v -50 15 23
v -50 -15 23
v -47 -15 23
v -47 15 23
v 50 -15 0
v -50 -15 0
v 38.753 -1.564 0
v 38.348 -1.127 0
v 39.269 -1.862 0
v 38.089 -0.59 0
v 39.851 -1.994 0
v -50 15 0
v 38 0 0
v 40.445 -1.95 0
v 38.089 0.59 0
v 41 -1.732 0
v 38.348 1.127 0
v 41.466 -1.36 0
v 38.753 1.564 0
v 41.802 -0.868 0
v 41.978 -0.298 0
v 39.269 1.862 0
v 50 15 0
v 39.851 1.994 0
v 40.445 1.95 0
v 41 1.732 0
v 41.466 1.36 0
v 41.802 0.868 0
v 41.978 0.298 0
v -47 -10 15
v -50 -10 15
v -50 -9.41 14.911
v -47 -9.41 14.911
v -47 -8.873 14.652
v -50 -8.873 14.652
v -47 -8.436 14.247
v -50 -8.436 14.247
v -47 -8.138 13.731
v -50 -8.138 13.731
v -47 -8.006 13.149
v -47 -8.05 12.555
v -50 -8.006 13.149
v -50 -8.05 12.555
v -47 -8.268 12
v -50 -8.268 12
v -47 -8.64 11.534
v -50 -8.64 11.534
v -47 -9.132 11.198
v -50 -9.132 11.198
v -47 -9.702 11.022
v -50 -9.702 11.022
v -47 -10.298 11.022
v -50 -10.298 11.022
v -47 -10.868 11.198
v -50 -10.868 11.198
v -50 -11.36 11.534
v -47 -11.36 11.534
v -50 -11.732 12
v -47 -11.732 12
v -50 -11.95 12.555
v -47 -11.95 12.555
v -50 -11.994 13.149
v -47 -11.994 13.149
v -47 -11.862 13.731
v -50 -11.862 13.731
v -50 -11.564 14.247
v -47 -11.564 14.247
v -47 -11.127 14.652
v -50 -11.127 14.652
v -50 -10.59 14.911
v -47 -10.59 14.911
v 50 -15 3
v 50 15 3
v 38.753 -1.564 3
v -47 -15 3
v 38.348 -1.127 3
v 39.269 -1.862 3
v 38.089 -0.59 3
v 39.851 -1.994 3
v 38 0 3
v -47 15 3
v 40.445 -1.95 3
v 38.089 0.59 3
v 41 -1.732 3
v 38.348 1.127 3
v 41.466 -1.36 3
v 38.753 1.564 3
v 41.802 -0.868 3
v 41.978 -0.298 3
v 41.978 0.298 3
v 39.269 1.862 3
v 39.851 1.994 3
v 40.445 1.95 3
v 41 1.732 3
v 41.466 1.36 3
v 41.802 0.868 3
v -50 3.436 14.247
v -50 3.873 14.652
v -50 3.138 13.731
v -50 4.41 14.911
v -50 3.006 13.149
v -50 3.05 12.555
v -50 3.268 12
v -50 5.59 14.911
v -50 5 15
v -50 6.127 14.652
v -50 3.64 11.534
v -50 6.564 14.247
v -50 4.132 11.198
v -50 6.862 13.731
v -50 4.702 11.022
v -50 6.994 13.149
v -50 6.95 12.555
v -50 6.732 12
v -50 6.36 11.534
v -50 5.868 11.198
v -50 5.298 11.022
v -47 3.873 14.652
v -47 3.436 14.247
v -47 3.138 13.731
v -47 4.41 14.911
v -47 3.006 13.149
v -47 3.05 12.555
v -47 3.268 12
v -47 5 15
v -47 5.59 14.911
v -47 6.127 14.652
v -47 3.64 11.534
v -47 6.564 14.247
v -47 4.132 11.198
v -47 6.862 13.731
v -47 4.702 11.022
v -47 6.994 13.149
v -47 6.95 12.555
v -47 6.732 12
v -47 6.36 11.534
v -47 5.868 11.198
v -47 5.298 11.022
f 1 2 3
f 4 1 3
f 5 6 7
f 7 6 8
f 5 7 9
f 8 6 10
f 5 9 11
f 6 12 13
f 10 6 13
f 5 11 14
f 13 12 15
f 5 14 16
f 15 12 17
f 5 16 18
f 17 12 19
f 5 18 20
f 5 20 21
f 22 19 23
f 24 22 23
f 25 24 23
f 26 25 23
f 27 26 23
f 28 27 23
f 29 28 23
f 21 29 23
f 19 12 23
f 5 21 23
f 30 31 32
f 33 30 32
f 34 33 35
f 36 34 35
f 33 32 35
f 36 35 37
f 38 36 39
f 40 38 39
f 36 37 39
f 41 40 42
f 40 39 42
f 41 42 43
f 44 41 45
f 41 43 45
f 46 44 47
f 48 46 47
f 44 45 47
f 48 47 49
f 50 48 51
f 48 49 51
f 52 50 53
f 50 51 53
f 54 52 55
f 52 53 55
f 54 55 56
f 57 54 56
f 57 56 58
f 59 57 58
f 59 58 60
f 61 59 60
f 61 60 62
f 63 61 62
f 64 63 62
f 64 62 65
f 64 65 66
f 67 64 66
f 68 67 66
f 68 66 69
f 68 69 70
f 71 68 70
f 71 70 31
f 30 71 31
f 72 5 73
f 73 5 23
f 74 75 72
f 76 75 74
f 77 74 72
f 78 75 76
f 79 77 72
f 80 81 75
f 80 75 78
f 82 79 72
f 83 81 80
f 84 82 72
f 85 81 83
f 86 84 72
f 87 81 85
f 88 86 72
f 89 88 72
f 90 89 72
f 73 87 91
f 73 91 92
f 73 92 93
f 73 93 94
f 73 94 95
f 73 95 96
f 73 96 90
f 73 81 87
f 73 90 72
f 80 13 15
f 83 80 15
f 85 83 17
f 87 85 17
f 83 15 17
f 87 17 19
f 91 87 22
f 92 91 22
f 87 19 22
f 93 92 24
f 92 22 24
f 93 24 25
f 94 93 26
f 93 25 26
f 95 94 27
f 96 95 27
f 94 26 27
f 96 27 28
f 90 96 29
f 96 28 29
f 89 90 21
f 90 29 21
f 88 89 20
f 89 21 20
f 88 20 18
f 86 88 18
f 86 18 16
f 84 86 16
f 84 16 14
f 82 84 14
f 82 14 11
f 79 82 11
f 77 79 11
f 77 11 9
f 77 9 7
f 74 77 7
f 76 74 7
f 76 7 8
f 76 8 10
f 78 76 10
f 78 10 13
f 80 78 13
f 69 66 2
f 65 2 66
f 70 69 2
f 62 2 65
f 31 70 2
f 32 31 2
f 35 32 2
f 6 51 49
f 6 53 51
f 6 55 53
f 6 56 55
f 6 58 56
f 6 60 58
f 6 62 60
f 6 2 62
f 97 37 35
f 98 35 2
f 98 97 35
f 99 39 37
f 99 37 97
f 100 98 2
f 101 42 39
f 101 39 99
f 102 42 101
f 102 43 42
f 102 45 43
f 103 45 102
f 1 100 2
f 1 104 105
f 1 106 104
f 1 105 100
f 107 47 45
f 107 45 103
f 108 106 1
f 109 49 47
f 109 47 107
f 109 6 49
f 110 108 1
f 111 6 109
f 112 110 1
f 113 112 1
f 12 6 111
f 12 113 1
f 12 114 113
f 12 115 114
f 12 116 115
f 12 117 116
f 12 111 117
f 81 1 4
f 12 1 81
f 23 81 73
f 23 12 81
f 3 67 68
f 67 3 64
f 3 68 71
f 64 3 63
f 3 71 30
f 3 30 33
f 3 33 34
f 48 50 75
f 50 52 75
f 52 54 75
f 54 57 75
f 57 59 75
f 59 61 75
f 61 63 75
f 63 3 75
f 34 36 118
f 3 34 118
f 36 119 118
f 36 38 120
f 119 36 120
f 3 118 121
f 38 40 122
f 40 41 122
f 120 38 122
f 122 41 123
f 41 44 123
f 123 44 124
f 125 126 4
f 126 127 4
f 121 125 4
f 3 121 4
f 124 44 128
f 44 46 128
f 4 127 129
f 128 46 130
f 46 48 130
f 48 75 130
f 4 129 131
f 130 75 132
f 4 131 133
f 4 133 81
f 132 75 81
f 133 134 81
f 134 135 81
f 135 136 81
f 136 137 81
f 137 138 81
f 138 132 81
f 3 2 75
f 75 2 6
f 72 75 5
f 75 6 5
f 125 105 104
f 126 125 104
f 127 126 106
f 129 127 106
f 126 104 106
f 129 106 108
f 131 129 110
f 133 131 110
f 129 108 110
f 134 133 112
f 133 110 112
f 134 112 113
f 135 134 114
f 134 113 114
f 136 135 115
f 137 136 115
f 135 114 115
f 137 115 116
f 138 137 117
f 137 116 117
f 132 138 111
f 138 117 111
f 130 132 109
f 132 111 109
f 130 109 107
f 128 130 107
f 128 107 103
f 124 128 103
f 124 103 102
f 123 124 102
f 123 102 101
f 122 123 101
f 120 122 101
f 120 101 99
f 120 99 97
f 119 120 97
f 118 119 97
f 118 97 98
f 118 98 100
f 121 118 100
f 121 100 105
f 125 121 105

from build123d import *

# Parameters (mm, degrees)
SKETCH1_W           = 100
SKETCH1_H           = 30
BOSS_EXTRUDE1_DEPTH = 3
SKETCH2_W           = 3
SKETCH2_H           = 30
BOSS_EXTRUDE2_DEPTH = 20
SKETCH3_R           = 2
CUT_EXTRUDE1_DEPTH  = 104.701494685
SKETCH4_R           = 2
CUT_EXTRUDE2_DEPTH  = 10


with BuildPart() as part:
    # Sketch1 → Boss-Extrude1 (new body)
    with BuildSketch(Plane.XY):
        Rectangle(SKETCH1_W, SKETCH1_H)
    extrude(amount=BOSS_EXTRUDE1_DEPTH)

    # Sketch2 → Boss-Extrude2 (add)
    with BuildSketch(Plane.XY.offset(3)):
        with Locations((-48.5, 0)):
            Rectangle(SKETCH2_W, SKETCH2_H)
    extrude(amount=BOSS_EXTRUDE2_DEPTH)

    # Sketch3 → Cut-Extrude1 (cut, through all)
    with BuildSketch(Plane.ZY.offset(50)):
        with Locations((13, 5)):
            Circle(SKETCH3_R)
        with Locations((13, -10)):
            Circle(SKETCH3_R)
    extrude(amount=-CUT_EXTRUDE1_DEPTH, mode=Mode.SUBTRACT)

    # Sketch4 → Cut-Extrude2 (cut)
    with BuildSketch(Plane(origin=(0, 0, 0), x_dir=(-1, 0, 0), z_dir=(0, 0, -1))):
        with Locations((-40, 0)):
            Circle(SKETCH4_R)
    extrude(amount=-CUT_EXTRUDE2_DEPTH, mode=Mode.SUBTRACT)


solid = part.part
